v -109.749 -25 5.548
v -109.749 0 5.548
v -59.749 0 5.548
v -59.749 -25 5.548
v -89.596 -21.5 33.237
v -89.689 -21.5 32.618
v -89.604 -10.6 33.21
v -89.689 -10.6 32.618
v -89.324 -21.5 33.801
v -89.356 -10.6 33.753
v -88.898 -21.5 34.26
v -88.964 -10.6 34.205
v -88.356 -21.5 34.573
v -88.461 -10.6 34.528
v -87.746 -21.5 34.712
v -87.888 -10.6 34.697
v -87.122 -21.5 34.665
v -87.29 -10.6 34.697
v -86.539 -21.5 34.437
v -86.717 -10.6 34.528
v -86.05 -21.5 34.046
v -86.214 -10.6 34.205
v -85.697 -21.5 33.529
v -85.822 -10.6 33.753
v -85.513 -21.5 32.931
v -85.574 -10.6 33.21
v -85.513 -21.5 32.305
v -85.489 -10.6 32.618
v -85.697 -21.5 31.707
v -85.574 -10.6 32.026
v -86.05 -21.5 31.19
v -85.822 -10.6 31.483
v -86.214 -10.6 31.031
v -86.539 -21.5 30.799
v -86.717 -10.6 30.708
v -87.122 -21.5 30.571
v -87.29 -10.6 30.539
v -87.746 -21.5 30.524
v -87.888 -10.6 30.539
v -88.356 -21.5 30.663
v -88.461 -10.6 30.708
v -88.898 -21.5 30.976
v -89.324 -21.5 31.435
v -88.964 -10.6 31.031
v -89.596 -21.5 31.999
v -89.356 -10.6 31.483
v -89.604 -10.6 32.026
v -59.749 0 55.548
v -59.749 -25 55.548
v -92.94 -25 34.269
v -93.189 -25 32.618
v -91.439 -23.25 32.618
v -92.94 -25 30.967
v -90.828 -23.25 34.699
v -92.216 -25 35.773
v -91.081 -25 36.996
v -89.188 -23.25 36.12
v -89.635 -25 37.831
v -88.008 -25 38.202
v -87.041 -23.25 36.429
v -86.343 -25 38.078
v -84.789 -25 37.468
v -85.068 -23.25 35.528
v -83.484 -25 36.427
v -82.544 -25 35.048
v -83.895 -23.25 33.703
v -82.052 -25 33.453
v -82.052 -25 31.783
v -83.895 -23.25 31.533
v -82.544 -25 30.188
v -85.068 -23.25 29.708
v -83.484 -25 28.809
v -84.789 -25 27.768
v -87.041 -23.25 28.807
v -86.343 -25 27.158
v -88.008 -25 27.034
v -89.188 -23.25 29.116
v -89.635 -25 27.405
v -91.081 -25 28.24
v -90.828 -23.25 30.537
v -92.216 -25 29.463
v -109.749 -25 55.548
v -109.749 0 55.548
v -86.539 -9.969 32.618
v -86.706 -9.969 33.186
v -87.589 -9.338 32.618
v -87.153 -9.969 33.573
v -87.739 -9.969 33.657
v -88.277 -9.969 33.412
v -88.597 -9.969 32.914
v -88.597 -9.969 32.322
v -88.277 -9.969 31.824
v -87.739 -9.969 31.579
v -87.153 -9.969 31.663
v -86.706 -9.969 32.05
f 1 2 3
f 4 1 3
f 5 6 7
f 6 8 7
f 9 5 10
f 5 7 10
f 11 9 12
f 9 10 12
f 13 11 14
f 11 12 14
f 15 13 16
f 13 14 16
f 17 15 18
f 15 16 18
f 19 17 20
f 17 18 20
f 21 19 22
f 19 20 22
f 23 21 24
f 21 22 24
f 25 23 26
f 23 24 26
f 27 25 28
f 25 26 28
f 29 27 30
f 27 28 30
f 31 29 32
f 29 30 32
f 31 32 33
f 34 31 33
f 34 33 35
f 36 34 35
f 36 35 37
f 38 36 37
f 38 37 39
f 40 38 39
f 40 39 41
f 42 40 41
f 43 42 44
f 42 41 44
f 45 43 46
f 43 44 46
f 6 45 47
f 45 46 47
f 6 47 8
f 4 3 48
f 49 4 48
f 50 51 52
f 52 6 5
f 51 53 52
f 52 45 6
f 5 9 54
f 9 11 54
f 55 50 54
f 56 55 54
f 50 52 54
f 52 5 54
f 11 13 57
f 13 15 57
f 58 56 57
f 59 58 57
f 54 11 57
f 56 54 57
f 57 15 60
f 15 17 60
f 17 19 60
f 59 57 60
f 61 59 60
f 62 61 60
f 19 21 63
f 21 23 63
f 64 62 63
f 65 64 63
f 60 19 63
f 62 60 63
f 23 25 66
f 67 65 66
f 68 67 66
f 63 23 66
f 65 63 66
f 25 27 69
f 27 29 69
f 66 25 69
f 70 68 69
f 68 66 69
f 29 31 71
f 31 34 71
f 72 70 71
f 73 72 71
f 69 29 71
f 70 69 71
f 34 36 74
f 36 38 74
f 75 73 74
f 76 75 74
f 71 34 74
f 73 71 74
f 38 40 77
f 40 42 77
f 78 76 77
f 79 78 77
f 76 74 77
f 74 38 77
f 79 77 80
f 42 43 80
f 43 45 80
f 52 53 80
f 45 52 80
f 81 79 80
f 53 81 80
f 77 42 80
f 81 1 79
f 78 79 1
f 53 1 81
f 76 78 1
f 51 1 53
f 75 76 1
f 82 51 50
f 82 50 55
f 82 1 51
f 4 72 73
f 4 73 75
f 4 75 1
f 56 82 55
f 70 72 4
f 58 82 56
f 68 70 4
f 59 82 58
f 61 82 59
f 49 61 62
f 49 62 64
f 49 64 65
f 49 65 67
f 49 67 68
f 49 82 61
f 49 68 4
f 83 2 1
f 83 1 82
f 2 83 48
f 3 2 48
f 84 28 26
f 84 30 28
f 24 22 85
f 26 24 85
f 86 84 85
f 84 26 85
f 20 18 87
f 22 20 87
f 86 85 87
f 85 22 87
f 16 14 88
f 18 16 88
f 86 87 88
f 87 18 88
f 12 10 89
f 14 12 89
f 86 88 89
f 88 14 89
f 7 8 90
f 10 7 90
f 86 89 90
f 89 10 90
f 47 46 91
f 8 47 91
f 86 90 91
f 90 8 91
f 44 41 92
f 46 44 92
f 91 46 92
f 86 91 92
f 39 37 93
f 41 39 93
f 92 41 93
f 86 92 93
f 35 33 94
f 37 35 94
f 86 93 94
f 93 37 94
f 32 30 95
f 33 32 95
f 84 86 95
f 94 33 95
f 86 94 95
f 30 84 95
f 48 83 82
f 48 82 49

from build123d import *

# Parameters (mm, degrees)
F0_W           = 50
F0_H           = 50
F1_DEPTH       = 25
F3_D           = 4.2
F3_DEPTH       = 14.4
F3_CSINK_D     = 11.2
F3_CSINK_ANGLE = 90
F3_TIP         = 1.2618073


with BuildPart() as f1:
    # F0 (on Front) → F1 (new body)
    with BuildSketch(Plane.XZ):
        with Locations((-84.7486946732, 30.5484851895)):
            Rectangle(F0_W, F0_H)
    extrude(amount=F1_DEPTH)

    # F3
    with Locations(Plane.XZ.offset(25)):
        with Locations((-87.5890702009, 32.6180011034)):
            CounterSinkHole(F3_D / 2, F3_CSINK_D / 2, depth=F3_DEPTH, counter_sink_angle=F3_CSINK_ANGLE)
            with Locations((0, 0, -(F3_DEPTH + F3_TIP / 2))):  # 118° drill point
                Cone(0, F3_D / 2, F3_TIP, mode=Mode.SUBTRACT)


solid = f1.part
